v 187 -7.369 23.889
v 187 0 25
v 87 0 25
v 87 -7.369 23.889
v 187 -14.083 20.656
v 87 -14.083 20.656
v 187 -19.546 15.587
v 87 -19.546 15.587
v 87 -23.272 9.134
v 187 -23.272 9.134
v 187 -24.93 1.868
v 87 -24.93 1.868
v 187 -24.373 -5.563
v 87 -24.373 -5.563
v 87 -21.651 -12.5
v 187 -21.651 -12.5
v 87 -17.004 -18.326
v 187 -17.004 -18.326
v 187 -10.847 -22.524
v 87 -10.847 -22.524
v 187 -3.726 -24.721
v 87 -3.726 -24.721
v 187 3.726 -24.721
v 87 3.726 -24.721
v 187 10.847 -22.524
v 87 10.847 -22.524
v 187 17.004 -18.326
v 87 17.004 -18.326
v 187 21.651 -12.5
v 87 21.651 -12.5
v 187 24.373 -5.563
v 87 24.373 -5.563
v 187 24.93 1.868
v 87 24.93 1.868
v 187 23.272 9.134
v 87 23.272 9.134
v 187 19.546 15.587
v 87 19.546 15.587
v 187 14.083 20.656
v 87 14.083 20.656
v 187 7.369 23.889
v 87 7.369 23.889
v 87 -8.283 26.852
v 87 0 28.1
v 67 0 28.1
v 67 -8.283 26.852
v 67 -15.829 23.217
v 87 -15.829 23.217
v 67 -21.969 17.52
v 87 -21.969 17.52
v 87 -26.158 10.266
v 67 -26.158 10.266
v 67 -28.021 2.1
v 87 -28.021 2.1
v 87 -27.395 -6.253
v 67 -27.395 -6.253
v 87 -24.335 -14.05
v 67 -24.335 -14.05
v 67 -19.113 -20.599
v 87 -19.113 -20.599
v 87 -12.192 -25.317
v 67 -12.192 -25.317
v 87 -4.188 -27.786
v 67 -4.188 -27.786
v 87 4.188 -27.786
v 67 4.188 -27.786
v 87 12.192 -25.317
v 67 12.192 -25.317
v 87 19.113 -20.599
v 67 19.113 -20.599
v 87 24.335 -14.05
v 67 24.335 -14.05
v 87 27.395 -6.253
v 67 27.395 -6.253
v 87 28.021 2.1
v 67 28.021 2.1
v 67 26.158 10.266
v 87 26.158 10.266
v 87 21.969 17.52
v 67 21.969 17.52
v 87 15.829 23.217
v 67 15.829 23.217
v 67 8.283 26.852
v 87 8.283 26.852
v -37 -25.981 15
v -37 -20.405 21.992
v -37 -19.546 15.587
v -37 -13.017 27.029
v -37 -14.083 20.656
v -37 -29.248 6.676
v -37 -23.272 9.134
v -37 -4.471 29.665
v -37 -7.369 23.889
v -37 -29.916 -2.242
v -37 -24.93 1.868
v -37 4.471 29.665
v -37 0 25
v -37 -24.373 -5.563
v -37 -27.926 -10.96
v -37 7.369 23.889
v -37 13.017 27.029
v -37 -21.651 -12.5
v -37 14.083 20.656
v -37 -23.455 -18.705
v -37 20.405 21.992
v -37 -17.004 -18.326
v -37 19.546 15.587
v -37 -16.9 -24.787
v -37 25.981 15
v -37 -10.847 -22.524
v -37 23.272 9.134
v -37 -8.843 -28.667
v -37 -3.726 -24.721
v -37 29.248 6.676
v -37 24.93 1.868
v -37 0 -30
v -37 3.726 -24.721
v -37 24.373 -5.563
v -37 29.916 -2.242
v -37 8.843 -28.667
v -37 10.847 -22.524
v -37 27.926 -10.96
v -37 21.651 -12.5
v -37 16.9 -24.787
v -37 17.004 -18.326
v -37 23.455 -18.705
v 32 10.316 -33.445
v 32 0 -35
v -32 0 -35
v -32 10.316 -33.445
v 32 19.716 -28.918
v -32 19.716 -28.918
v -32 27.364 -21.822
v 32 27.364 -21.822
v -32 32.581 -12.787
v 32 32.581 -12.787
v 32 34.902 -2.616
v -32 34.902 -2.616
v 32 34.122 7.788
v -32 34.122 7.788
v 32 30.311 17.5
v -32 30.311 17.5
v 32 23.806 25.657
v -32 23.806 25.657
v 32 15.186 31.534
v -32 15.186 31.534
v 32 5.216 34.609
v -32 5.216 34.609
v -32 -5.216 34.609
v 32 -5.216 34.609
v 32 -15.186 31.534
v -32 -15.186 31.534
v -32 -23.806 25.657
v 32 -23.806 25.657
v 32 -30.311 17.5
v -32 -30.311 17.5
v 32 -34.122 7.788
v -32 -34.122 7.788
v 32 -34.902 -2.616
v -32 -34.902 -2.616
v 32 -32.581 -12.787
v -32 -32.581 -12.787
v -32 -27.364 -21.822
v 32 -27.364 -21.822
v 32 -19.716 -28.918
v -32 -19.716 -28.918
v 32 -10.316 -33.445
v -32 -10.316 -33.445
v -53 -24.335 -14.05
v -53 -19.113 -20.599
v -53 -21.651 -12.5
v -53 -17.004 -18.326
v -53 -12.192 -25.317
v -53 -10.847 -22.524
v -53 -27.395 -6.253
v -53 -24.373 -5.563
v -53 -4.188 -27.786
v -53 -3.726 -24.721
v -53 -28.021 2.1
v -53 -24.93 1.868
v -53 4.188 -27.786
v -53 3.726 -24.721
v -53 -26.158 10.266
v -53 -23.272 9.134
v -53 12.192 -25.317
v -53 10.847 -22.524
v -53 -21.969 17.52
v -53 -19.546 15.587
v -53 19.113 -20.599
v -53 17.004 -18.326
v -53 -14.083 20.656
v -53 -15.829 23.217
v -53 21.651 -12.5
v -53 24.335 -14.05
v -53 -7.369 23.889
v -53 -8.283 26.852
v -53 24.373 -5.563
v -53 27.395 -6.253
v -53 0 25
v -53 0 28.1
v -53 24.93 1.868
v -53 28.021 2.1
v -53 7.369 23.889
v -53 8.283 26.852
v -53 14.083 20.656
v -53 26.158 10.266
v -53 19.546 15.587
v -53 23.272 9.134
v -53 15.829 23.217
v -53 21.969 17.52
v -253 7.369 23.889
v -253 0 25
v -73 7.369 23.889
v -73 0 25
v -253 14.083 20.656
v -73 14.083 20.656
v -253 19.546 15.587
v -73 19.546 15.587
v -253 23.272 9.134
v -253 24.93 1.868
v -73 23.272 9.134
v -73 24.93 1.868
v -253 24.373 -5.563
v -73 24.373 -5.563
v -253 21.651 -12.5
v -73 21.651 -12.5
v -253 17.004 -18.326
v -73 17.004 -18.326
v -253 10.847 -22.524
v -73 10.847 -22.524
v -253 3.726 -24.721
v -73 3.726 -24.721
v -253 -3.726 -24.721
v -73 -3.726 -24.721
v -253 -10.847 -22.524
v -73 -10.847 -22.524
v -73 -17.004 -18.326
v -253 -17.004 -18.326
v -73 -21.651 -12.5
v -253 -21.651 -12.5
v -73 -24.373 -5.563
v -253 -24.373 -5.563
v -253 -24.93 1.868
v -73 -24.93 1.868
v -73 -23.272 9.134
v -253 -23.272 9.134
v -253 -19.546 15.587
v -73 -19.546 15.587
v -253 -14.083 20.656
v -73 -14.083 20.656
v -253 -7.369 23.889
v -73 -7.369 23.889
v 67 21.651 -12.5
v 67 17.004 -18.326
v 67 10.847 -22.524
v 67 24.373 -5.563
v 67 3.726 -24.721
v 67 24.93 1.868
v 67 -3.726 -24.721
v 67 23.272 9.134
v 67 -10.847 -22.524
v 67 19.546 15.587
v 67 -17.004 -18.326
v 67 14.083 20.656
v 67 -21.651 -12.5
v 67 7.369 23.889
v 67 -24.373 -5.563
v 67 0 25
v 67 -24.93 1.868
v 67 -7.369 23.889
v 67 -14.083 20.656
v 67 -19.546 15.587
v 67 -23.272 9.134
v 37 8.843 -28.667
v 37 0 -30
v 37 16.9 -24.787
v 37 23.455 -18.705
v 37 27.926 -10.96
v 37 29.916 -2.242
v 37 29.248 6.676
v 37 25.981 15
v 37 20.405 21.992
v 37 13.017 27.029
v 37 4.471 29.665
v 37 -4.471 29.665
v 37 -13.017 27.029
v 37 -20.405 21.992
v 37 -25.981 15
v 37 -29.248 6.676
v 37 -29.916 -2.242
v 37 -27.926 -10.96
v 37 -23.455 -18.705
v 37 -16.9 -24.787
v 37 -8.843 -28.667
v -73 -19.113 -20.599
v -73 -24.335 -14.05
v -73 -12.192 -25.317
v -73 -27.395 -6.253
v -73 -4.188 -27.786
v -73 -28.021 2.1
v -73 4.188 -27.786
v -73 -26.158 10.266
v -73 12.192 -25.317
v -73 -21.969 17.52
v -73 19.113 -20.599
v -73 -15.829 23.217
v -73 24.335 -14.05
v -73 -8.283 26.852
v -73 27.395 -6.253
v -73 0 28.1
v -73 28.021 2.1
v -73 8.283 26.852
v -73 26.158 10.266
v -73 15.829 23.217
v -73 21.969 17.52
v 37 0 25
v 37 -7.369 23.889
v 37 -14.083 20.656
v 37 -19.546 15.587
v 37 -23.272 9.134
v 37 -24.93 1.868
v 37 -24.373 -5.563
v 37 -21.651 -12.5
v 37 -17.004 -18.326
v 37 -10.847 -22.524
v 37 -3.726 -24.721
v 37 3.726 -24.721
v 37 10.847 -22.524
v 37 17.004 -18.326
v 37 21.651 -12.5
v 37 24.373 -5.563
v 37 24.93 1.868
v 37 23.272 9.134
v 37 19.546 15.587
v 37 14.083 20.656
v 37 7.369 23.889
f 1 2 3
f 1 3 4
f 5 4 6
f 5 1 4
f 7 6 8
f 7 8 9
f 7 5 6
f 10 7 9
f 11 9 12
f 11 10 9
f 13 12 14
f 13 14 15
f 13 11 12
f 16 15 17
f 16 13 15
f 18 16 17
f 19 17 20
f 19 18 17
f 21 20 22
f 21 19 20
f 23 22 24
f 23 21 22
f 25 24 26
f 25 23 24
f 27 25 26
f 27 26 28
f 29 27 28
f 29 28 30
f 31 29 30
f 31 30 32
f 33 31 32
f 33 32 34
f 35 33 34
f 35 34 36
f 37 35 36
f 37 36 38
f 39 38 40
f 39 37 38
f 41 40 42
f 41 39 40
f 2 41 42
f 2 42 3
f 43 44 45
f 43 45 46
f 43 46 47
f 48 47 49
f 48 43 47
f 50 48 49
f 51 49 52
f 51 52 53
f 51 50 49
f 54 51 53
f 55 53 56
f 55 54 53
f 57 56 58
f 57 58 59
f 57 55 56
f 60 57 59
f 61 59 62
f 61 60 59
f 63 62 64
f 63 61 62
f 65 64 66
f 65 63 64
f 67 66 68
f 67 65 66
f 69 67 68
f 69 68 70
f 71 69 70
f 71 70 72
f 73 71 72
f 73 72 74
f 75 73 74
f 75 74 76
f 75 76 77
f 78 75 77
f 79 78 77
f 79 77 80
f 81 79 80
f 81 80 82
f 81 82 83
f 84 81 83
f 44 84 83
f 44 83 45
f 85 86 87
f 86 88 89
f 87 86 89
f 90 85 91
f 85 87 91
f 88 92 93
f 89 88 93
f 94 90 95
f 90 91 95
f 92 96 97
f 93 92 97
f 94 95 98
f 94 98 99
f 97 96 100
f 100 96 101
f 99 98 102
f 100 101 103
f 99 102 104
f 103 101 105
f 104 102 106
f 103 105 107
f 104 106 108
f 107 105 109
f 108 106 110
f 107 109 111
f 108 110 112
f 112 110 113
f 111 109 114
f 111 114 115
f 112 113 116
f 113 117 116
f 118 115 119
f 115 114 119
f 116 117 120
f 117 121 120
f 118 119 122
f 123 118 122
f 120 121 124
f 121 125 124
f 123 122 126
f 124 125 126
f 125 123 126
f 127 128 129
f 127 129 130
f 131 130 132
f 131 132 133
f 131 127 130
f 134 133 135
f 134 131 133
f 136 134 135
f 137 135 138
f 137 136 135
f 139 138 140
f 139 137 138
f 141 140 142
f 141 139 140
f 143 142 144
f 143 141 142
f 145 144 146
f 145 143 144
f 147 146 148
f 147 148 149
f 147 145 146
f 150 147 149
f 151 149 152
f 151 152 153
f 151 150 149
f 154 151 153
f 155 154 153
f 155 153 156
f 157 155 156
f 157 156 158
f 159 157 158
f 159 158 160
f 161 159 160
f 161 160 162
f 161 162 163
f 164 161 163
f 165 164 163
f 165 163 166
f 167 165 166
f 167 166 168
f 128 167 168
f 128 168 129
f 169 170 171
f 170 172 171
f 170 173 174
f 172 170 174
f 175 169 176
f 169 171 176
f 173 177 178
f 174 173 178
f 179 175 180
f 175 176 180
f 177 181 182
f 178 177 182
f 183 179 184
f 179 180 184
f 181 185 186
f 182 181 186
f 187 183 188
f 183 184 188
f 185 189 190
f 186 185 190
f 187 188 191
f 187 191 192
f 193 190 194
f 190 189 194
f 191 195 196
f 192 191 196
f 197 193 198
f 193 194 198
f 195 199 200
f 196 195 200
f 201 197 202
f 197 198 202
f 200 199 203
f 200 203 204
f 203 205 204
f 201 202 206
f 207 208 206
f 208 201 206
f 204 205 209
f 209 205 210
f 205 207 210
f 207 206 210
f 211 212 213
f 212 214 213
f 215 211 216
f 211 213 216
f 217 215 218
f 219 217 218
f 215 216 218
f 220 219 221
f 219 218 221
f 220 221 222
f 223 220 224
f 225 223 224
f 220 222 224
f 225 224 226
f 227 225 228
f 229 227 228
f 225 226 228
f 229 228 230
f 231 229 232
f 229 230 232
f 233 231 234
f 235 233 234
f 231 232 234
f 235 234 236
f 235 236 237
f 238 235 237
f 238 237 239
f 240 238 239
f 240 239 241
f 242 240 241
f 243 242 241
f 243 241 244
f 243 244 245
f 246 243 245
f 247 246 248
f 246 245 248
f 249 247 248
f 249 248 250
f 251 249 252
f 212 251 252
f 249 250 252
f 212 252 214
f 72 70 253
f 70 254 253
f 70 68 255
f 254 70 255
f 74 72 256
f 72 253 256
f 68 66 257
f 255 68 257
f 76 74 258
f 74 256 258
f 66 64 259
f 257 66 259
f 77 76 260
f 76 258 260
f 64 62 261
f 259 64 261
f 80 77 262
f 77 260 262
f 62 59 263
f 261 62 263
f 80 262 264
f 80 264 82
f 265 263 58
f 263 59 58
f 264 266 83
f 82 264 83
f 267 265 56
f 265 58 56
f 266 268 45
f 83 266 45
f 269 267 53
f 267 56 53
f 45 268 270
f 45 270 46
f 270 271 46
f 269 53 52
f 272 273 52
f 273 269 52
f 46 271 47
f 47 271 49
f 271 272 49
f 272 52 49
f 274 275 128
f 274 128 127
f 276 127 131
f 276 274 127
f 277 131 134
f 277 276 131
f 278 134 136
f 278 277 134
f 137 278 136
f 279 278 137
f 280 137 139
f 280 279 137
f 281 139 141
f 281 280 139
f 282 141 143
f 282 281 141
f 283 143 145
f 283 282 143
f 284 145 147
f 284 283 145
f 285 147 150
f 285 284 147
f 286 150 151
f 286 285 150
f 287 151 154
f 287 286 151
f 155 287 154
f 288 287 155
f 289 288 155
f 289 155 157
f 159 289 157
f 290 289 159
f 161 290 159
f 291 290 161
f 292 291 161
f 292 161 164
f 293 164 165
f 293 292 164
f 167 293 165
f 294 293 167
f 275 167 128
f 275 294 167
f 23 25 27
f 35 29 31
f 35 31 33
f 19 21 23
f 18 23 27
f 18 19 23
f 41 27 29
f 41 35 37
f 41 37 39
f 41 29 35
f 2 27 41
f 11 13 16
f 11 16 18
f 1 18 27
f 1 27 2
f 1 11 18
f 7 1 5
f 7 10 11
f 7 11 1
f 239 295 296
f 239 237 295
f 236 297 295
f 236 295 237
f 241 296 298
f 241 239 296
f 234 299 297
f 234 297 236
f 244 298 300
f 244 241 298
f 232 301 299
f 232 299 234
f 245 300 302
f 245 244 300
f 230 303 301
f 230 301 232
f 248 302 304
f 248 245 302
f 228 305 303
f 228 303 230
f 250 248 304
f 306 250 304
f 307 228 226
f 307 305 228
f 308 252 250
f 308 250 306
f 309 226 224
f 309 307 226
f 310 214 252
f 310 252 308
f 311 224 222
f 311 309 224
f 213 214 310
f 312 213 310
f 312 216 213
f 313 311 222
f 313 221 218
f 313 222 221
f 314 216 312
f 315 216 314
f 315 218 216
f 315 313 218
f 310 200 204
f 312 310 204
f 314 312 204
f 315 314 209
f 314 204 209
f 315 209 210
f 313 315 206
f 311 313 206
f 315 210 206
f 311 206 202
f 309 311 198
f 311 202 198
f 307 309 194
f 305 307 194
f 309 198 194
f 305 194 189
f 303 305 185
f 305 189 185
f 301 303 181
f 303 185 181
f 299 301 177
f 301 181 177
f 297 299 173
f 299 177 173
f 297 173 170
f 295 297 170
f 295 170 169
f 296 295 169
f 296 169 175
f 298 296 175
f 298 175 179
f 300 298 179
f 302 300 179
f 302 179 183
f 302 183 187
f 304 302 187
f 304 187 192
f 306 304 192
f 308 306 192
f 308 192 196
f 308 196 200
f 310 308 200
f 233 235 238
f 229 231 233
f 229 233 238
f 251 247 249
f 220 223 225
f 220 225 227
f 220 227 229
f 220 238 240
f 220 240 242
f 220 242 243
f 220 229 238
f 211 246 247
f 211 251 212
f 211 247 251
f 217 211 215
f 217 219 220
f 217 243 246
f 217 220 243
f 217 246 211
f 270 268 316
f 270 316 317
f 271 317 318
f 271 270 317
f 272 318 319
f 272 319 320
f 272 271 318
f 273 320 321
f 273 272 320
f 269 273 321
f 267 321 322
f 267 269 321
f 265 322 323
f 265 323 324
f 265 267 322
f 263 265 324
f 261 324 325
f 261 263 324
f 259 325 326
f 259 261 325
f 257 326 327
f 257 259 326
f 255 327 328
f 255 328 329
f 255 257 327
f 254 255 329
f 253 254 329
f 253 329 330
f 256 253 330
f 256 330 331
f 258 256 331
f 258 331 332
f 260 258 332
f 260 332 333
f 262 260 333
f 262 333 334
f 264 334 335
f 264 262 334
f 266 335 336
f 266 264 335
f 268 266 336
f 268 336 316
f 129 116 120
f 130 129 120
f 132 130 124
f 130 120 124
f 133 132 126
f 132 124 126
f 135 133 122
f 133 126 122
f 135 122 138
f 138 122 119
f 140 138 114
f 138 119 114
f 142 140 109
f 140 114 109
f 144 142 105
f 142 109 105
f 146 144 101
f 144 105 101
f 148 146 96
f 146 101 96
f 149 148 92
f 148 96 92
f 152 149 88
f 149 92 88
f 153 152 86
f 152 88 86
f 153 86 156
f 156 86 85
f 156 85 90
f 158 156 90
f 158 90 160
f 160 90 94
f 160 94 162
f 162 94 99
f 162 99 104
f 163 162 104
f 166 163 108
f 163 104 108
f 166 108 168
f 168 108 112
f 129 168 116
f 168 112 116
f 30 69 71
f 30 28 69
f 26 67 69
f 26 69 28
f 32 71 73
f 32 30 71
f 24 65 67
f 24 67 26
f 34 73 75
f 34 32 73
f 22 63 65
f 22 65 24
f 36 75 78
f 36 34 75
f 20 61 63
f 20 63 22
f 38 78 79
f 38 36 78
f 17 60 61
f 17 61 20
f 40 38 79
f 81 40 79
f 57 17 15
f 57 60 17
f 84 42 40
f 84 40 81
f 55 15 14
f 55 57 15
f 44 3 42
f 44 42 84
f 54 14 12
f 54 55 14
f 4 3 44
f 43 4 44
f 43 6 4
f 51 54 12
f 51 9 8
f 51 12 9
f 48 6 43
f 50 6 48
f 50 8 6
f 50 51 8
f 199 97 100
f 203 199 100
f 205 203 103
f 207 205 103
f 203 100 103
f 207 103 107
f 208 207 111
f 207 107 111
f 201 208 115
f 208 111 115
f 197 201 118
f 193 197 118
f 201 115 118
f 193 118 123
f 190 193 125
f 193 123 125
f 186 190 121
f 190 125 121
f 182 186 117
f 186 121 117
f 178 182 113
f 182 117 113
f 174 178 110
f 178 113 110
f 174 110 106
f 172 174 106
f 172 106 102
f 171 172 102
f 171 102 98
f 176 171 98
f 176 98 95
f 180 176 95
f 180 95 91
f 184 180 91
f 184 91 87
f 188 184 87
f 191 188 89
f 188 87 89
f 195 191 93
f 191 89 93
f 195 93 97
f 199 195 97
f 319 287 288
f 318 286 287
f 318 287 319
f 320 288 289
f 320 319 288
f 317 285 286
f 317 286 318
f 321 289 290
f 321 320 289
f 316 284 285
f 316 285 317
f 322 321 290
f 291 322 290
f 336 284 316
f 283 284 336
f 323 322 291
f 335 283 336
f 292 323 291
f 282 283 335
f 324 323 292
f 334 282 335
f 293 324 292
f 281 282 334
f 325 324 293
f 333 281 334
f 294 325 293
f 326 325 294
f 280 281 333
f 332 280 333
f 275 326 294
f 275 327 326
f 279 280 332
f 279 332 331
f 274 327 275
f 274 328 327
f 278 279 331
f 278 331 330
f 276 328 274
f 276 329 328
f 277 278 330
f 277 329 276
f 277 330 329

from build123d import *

# Parameters (mm, degrees)
CROQUIS1_R              = 35
SALIENTE_EXTRUIR1_DEPTH = 37
CHAFL_N1_SIZE           = 5
CROQUIS2_R              = 25
SALIENTE_EXTRUIR2_DEPTH = 16
CROQUIS3_R              = 28.1
SALIENTE_EXTRUIR3_DEPTH = 120
SALIENTE_EXTRUIR4_START = 30
CROQUIS4_R              = 25
SALIENTE_EXTRUIR4_DEPTH = 30
SALIENTE_EXTRUIR5_START = 120
CROQUIS5_R              = 28.1
SALIENTE_EXTRUIR5_DEPTH = 120
CORTAR_EXTRUIR1_START   = -100
CROQUIS6_R              = 28.1
CROQUIS6_R_2            = 25
CORTAR_EXTRUIR1_DEPTH   = 100
CROQUIS8_R              = 28.1
CROQUIS8_R_2            = 25
CORTAR_EXTRUIR2_DEPTH   = 100
CROQUIS9_R              = 25
SALIENTE_EXTRUIR6_DEPTH = 80


with BuildPart() as part:
    # Croquis1 → Saliente-Extruir1 (new, symmetric)
    with BuildSketch(Plane(origin=(0, 0, 0), x_dir=(0, 0, -1), z_dir=(1, 0, 0))):
        Circle(CROQUIS1_R)
    extrude(amount=SALIENTE_EXTRUIR1_DEPTH, both=True)

    # Chaflán1
    chafl_n1_edges = [part.edges().sort_by_distance(p)[0] for p in [
        (-37, 0, 35),
        (37, 0, 35),
    ]]
    chamfer(chafl_n1_edges, length=CHAFL_N1_SIZE)

    # Croquis2 → Saliente-Extruir2 (add)
    with BuildSketch(Plane.ZY.offset(37)):
        Circle(CROQUIS2_R)
    extrude(amount=SALIENTE_EXTRUIR2_DEPTH)

    # Croquis3 → Saliente-Extruir3 (add)
    with BuildSketch(Plane.ZY.offset(53)):
        Circle(CROQUIS3_R)
    extrude(amount=SALIENTE_EXTRUIR3_DEPTH)

    # Croquis4 → Saliente-Extruir4 (add)
    with BuildSketch(Plane(origin=(37, 0, 0), x_dir=(0, 0, -1), z_dir=(1, 0, 0)).offset(SALIENTE_EXTRUIR4_START)):
        with Locations(Location((0, 0, 0), (0, 0, 180))):
            Circle(CROQUIS4_R)
    extrude(amount=-SALIENTE_EXTRUIR4_DEPTH)

    # Croquis5 → Saliente-Extruir5 (add)
    with BuildSketch(Plane(origin=(67, 0, 0), x_dir=(0, 0, -1), z_dir=(1, 0, 0)).offset(SALIENTE_EXTRUIR5_START)):
        with Locations(Location((0, 0, 0), (0, 0, 180))):
            Circle(CROQUIS5_R)
    extrude(amount=-SALIENTE_EXTRUIR5_DEPTH)

    # Croquis6 → Cortar-Extruir1 (cut)
    with BuildSketch(Plane.ZY.offset(173).offset(CORTAR_EXTRUIR1_START)):
        Circle(CROQUIS6_R)
        Circle(CROQUIS6_R_2, mode=Mode.SUBTRACT)
    extrude(amount=CORTAR_EXTRUIR1_DEPTH, mode=Mode.SUBTRACT)

    # Croquis8 → Cortar-Extruir2 (cut)
    with BuildSketch(Plane(origin=(187, 0, 0), x_dir=(0, 0, -1), z_dir=(1, 0, 0))):
        with Locations(Location((0, 0, 0), (0, 0, 180))):
            Circle(CROQUIS8_R)
        with Locations(Location((0, 0, 0), (0, 0, 180))):
            Circle(CROQUIS8_R_2, mode=Mode.SUBTRACT)
    extrude(amount=-CORTAR_EXTRUIR2_DEPTH, mode=Mode.SUBTRACT)

    # Croquis9 → Saliente-Extruir6 (add)
    with BuildSketch(Plane.ZY.offset(173)):
        Circle(CROQUIS9_R)
    extrude(amount=SALIENTE_EXTRUIR6_DEPTH)


solid = part.part
